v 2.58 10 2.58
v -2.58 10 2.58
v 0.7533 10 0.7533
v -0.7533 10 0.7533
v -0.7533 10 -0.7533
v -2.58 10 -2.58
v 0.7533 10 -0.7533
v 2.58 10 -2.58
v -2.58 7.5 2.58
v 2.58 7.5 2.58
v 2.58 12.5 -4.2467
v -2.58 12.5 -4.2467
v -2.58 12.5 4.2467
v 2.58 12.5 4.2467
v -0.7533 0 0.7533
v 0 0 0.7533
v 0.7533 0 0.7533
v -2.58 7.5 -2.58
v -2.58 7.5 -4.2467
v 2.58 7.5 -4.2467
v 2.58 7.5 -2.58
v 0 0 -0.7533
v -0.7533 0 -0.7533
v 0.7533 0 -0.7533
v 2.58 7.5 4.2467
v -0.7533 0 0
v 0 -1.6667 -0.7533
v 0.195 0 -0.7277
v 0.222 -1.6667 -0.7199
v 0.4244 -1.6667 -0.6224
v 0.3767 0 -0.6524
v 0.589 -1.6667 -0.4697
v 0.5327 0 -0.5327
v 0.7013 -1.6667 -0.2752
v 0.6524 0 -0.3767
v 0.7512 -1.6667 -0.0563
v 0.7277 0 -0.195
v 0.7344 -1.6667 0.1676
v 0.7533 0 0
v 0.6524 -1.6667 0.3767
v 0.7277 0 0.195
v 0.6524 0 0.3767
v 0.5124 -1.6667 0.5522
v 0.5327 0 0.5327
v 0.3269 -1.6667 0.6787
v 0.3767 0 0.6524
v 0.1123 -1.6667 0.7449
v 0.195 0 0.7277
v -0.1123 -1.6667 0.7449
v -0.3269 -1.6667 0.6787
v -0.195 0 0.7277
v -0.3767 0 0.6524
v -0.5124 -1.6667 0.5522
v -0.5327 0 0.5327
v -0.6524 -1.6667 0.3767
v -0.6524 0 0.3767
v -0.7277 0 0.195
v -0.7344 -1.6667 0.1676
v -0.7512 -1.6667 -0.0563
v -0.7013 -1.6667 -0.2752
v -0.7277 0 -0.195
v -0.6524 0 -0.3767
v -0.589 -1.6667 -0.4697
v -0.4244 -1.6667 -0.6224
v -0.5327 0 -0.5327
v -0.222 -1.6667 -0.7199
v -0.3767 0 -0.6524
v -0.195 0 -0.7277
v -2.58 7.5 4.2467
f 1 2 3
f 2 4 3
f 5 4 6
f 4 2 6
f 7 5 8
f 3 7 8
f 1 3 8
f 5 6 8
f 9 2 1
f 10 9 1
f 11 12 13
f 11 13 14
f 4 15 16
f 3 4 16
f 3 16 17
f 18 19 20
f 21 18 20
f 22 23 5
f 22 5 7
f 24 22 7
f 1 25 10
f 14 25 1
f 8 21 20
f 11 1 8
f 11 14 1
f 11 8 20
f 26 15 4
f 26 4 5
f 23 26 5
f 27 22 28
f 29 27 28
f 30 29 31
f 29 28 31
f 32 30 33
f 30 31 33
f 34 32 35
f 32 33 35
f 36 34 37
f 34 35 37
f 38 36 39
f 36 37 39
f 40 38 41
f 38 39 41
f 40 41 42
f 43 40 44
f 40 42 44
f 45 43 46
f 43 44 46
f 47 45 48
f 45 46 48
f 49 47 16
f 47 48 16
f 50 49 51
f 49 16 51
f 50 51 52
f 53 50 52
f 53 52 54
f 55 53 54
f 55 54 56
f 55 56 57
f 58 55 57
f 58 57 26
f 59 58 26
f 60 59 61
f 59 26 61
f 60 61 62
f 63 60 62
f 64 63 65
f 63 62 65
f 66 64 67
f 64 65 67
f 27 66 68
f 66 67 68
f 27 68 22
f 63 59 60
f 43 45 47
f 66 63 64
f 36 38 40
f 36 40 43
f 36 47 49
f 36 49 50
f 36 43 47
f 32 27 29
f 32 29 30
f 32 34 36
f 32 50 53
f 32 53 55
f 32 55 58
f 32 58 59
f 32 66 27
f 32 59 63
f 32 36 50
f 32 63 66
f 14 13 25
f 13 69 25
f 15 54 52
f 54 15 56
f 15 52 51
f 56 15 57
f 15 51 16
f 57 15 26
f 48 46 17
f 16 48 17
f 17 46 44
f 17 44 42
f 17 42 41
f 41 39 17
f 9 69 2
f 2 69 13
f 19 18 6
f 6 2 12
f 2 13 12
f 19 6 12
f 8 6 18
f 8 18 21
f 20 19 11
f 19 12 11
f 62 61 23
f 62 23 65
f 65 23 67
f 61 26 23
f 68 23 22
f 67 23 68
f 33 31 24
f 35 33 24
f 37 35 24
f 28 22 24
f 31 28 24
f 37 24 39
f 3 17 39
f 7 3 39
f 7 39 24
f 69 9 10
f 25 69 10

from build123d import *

# Parameters (mm, degrees)
SKETCH1_W           = 1.506666666
SKETCH1_H           = 1.506666666
PIN_DEPTH           = 10
SKETCH2_R           = 0.753333333
TIP_DEPTH           = 1.666666667
SKETCH3_W           = 5.16
SKETCH3_H           = 8.493333334
HANDLE_DEPTH        = 2.5
SKETCH3_3_W         = 5.16
SKETCH3_3_H         = 1.666666667
BOSS_EXTRUDE4_DEPTH = 2.5


with BuildPart() as part:
    # Sketch1 → Pin (new body)
    with BuildSketch(Plane(origin=(0, 0, 0), x_dir=(1, 0, 0), z_dir=(0, 1, 0))):
        Rectangle(SKETCH1_W, SKETCH1_H)
    extrude(amount=PIN_DEPTH)

    # Sketch2 → Tip (add)
    with BuildSketch(Plane.XZ):
        Circle(SKETCH2_R)
    extrude(amount=TIP_DEPTH)

    # Sketch3 → Handle (add)
    with BuildSketch(Plane(origin=(0, 10, 0), x_dir=(1, 0, 0), z_dir=(0, 1, 0))):
        Rectangle(SKETCH3_W, SKETCH3_H)
    extrude(amount=HANDLE_DEPTH)

    # Sketch3<3> → Boss-Extrude4 (add)
    with BuildSketch(Plane(origin=(0, 10, 0), x_dir=(1, 0, 0), z_dir=(0, 1, 0))):
        with Locations((0, 3.413333334)):
            Rectangle(SKETCH3_3_W, SKETCH3_3_H)
        with Locations((0, -3.413333334)):
            Rectangle(SKETCH3_3_W, SKETCH3_3_H)
    extrude(amount=-BOSS_EXTRUDE4_DEPTH)


solid = part.part
